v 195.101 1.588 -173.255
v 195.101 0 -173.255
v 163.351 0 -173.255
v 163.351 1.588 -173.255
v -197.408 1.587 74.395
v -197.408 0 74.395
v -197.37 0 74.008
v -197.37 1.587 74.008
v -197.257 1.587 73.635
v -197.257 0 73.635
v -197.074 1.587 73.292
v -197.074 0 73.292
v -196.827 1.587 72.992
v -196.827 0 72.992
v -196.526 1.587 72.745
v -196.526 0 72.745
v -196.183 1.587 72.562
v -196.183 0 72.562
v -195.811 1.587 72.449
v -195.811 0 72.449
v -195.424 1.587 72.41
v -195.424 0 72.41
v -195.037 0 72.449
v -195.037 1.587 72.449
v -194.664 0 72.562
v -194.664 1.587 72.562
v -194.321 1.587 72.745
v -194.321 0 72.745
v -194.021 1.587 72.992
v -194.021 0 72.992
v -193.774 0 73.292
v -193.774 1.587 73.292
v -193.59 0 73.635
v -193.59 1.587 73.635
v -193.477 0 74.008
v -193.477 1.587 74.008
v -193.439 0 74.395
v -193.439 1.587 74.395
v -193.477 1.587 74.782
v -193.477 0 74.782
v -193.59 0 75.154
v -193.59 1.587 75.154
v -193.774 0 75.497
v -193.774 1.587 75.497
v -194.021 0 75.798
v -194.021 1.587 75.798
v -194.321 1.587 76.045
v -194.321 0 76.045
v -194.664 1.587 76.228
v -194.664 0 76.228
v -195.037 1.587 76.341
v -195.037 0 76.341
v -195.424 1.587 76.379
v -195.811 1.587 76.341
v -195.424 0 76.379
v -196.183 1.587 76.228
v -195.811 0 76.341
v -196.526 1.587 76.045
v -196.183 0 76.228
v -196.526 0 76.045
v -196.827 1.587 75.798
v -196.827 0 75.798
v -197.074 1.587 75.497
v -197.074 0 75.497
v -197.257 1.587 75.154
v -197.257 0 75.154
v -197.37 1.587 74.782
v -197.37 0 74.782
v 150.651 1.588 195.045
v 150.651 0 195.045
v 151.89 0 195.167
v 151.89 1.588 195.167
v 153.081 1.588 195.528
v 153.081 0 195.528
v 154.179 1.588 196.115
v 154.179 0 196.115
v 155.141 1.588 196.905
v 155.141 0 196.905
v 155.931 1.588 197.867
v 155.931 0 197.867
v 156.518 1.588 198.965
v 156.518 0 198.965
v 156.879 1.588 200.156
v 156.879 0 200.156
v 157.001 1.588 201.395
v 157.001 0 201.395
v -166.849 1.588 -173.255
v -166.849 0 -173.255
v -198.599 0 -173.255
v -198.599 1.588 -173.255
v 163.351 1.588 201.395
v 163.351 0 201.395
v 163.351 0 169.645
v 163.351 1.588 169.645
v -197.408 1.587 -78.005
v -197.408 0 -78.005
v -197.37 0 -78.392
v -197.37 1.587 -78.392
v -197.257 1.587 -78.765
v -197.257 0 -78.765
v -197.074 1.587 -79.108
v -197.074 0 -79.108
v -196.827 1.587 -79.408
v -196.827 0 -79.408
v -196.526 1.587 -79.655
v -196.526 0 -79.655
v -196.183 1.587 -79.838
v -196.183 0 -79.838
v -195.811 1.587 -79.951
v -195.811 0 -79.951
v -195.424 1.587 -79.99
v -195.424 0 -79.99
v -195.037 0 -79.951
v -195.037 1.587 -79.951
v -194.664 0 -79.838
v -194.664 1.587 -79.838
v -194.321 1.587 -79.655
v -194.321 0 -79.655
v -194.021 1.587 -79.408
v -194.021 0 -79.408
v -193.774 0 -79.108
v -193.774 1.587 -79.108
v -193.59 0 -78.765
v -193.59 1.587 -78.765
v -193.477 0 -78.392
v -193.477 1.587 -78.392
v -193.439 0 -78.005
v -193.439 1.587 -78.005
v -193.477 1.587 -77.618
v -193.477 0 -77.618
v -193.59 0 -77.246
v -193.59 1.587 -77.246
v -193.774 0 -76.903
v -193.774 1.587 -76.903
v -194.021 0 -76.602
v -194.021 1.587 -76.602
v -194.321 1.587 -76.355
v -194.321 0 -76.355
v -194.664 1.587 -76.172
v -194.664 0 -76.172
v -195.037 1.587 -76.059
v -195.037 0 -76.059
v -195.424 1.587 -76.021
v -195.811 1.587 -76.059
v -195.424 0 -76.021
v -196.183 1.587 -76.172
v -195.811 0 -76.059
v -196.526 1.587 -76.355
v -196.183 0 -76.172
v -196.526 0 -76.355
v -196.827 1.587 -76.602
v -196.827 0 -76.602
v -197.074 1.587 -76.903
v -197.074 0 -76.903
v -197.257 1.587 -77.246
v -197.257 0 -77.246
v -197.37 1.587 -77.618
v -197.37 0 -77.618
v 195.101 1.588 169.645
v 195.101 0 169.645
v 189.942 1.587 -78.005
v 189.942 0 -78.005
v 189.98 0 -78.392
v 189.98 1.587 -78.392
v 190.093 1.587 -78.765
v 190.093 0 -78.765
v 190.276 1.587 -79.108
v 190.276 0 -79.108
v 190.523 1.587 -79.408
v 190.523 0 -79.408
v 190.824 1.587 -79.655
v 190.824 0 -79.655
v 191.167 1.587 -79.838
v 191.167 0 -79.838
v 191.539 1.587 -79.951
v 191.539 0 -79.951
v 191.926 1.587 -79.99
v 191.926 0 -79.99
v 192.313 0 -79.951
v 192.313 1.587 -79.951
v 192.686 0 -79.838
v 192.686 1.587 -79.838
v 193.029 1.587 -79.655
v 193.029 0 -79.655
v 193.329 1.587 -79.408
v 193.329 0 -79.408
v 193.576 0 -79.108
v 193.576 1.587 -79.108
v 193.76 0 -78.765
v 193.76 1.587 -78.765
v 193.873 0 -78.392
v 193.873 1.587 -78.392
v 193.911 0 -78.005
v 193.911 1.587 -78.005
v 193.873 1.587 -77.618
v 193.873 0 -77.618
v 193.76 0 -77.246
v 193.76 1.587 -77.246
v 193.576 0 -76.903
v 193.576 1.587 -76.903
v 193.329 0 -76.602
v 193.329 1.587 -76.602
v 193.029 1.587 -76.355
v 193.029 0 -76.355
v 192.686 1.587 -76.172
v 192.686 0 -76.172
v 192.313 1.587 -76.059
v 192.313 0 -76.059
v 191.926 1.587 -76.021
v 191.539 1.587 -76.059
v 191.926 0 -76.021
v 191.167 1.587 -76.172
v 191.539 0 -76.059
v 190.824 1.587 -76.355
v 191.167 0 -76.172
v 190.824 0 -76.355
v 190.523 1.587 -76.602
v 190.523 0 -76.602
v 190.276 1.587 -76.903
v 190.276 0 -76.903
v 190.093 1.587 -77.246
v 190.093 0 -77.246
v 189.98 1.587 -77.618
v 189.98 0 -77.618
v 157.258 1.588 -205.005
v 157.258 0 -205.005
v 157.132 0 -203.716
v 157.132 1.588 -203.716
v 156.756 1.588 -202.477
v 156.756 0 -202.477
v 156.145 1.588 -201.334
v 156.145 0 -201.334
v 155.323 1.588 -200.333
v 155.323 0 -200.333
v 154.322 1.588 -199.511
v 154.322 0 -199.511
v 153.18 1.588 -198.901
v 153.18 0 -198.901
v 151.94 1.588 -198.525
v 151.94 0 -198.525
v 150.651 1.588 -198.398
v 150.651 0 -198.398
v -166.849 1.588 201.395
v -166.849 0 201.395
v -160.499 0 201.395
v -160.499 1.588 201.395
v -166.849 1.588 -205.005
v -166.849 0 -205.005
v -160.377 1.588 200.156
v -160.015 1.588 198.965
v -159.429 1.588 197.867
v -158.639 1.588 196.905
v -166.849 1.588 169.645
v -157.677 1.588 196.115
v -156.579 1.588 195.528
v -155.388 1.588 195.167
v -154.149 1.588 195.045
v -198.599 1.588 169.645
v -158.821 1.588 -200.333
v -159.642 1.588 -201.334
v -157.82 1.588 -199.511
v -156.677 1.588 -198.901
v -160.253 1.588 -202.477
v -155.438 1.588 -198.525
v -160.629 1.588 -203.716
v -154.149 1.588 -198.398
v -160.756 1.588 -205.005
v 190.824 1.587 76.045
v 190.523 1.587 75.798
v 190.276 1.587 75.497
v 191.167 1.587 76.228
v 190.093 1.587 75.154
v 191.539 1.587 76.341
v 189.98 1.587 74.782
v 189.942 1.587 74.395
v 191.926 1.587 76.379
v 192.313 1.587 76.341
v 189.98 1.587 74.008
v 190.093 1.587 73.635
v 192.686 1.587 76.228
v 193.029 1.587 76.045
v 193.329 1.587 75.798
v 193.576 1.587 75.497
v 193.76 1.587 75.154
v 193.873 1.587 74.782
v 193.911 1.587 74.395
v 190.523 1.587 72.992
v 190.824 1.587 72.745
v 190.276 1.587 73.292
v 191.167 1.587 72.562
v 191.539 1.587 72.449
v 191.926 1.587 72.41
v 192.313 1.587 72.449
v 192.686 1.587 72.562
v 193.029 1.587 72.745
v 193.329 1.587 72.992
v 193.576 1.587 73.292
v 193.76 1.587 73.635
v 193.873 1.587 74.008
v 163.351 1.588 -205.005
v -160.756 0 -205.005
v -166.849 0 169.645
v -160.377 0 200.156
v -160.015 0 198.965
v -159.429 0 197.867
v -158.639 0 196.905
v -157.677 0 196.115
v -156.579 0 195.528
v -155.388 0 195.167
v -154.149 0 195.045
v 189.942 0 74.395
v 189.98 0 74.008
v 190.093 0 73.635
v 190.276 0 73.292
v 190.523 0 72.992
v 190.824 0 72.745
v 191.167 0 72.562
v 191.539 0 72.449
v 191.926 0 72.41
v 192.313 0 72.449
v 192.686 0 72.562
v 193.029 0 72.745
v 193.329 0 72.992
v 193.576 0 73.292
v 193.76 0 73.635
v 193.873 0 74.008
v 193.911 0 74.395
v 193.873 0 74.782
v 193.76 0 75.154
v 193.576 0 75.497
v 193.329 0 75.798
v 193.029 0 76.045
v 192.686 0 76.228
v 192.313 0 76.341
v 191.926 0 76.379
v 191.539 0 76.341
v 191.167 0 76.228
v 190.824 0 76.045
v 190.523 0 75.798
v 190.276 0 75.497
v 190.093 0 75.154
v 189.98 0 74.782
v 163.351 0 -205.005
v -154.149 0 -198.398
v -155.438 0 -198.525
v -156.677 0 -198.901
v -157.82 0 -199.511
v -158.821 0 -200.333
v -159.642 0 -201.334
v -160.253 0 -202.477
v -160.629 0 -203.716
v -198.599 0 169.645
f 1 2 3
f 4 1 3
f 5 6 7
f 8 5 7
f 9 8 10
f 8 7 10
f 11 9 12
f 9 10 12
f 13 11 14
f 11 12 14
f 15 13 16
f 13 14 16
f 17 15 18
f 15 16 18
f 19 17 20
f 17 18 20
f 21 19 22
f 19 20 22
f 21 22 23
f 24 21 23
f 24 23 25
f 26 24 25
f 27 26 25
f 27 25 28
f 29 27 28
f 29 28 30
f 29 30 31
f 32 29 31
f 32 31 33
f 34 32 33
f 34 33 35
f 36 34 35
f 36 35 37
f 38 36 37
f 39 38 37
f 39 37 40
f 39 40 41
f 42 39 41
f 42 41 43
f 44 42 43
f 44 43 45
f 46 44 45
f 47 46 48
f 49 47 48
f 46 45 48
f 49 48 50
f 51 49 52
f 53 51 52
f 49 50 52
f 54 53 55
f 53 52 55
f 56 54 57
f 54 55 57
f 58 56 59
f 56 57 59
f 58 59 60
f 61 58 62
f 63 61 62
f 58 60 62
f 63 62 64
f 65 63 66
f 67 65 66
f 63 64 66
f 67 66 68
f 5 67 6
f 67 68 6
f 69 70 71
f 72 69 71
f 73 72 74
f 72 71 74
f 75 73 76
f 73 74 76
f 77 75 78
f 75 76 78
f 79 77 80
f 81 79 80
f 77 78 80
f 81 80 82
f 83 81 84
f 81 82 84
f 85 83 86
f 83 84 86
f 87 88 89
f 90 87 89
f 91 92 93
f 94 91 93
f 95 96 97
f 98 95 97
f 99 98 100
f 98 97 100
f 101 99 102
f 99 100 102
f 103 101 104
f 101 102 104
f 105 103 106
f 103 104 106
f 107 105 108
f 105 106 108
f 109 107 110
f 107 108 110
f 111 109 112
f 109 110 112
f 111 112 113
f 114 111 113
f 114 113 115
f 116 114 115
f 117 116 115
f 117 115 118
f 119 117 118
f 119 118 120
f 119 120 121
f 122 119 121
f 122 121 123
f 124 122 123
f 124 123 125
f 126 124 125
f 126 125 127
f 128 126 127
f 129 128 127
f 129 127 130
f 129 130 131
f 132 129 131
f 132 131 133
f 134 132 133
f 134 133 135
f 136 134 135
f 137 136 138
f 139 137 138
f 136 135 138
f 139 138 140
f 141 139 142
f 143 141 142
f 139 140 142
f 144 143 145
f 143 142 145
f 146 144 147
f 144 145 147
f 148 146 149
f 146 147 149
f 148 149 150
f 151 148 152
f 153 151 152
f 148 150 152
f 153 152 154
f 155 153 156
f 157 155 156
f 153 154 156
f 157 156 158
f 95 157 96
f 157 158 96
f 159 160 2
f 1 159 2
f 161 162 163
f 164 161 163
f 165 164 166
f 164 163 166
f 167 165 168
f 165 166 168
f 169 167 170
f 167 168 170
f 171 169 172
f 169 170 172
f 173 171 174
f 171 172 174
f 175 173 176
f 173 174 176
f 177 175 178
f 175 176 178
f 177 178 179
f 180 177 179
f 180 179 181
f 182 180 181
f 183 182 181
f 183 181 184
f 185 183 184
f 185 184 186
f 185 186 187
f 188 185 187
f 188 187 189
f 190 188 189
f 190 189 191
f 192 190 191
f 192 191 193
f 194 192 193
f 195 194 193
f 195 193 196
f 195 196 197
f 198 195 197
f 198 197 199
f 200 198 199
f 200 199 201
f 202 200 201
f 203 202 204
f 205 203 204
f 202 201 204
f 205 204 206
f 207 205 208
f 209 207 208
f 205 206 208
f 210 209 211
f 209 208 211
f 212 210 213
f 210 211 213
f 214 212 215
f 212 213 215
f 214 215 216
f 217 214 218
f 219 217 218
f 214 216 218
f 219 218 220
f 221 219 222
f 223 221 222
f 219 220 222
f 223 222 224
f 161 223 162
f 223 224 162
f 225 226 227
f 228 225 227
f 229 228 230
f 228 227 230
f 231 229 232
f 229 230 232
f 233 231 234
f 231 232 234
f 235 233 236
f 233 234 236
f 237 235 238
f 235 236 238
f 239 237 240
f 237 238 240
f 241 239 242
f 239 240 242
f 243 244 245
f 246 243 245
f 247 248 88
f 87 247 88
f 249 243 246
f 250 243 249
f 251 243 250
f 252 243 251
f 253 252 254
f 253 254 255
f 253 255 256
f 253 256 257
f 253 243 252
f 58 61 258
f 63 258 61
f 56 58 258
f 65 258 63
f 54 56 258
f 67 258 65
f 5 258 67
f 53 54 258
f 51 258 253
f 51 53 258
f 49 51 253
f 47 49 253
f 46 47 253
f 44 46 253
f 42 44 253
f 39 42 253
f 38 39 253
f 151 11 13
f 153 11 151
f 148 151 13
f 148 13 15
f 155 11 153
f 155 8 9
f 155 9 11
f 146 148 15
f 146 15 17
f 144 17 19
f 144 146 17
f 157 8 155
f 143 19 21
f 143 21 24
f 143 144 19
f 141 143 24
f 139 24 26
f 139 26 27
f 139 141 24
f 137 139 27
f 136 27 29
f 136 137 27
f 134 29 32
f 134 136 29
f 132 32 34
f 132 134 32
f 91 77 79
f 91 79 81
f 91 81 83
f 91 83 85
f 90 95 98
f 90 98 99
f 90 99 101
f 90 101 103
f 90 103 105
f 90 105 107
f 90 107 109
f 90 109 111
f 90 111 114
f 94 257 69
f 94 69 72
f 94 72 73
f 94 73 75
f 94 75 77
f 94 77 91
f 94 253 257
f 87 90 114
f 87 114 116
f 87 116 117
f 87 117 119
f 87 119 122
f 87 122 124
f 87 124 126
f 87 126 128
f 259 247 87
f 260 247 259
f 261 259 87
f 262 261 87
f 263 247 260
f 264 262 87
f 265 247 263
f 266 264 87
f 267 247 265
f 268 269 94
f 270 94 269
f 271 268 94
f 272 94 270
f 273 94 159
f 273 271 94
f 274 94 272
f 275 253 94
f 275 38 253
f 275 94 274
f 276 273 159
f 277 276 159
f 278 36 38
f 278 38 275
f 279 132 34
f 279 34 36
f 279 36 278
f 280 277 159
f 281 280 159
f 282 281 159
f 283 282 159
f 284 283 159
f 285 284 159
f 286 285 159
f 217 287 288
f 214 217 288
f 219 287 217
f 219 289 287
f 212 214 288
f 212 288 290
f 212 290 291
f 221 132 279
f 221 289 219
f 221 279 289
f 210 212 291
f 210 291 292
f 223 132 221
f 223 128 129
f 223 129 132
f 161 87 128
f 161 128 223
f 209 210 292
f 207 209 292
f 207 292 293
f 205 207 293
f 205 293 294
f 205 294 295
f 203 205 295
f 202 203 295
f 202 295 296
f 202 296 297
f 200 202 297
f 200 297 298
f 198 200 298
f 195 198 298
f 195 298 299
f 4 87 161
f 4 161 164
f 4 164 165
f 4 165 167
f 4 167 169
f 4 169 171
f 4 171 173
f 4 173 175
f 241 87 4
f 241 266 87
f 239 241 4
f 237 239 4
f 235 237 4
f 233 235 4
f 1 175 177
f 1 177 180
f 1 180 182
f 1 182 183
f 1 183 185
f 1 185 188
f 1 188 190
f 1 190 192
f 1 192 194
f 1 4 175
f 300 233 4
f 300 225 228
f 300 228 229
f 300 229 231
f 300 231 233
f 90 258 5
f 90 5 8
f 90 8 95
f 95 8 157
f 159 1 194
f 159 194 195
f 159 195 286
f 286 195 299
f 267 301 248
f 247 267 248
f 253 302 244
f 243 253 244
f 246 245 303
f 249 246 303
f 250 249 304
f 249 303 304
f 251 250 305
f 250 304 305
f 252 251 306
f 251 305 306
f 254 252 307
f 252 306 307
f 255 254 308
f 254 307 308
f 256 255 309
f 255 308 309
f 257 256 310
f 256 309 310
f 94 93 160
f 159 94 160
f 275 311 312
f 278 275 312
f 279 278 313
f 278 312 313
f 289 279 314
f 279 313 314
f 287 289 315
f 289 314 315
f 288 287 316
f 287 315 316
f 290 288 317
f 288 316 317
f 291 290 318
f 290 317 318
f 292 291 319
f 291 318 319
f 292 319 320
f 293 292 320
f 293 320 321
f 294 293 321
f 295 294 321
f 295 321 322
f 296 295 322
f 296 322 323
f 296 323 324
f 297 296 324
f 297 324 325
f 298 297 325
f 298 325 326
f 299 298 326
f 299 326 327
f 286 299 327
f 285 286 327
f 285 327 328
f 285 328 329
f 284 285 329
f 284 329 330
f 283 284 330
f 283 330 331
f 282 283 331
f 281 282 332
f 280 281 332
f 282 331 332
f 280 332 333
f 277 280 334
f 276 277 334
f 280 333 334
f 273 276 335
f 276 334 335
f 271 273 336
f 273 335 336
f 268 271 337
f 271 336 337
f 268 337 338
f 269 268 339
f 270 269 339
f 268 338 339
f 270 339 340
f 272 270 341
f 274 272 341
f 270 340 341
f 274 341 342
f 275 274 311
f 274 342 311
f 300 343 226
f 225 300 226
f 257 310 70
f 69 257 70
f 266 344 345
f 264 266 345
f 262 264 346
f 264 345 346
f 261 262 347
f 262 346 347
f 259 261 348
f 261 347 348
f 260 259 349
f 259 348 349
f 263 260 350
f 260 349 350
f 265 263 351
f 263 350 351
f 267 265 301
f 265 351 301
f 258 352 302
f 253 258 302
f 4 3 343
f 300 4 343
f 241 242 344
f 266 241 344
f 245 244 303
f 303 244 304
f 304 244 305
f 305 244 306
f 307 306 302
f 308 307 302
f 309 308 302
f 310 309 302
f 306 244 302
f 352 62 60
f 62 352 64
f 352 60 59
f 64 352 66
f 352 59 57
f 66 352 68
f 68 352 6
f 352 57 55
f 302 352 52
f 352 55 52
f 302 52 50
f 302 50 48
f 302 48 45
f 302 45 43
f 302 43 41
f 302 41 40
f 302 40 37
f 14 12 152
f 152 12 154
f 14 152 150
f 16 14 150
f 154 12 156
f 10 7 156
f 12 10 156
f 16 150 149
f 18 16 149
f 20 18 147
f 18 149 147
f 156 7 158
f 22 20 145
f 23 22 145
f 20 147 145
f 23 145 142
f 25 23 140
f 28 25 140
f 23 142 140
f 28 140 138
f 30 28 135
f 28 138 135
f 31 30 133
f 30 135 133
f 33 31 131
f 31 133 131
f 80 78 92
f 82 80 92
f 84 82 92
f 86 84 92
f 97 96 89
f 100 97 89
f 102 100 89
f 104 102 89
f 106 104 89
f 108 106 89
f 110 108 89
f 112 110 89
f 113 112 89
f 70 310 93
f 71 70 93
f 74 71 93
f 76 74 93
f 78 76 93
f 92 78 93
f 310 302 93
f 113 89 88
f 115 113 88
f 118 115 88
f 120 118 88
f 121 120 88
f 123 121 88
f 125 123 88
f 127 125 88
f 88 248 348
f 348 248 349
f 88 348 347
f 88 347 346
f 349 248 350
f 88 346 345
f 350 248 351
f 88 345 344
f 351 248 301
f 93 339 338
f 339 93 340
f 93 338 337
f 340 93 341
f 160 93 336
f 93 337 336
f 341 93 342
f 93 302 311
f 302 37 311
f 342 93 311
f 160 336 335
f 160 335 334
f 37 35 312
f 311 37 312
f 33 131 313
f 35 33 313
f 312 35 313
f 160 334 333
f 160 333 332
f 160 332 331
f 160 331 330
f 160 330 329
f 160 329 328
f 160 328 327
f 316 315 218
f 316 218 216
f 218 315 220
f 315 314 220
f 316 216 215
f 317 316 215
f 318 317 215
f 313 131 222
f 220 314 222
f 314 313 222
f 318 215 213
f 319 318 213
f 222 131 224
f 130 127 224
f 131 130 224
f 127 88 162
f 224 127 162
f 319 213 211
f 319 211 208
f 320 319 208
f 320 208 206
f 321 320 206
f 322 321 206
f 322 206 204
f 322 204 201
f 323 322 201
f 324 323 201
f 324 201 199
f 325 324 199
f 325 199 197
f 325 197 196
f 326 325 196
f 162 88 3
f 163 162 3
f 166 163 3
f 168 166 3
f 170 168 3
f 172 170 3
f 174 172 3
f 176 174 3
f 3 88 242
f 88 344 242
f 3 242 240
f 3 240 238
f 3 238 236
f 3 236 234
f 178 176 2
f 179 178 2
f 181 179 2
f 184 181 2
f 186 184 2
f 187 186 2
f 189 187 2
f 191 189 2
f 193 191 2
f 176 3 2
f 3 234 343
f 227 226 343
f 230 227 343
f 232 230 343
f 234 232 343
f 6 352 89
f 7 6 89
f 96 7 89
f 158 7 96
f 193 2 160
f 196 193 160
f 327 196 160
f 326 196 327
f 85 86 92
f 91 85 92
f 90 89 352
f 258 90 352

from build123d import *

# Parameters (mm, degrees)
BOSS_EXTRUDE1_DEPTH             = 1.5875
F_5_32_0_15625_DIAMETER_HOLE1_D = 3.96875


with BuildPart() as part:
    # Sketch1 → Boss-Extrude1 (new body)
    with BuildSketch(Plane(origin=(0, 0, 0), x_dir=(1, 0, 0), z_dir=(0, 1, 0))):
        with BuildLine():
            Line((-160.755952561, 205.005137025), (-166.848726493, 205.005137025))
            Line((-166.848726493, 205.005137025), (-166.848726493, 173.255137025))
            Line((-166.848726493, 173.255137025), (-198.598726493, 173.255137025))
            Line((-198.598726493, 173.255137025), (-198.598726493, -169.644862975))
            Line((-198.598726493, -169.644862975), (-166.848726493, -169.644862975))
            Line((-166.848726493, -169.644862975), (-166.848726493, -201.394862975))
            Line((-166.848726493, -201.394862975), (-160.498726493, -201.394862975))
            ThreePointArc((-160.498726493, -201.394862975), (-158.638854554, -196.904734914), (-154.148726493, -195.044862975))
            Line((-154.148726493, -195.044862975), (150.651273507, -195.044862975))
            ThreePointArc((150.651273507, -195.044862975), (155.141401567, -196.904734914), (157.001273507, -201.394862975))
            Line((157.001273507, -201.394862975), (163.351273507, -201.394862975))
            Line((163.351273507, -201.394862975), (163.351273507, -169.644862975))
            Line((163.351273507, -169.644862975), (195.101273507, -169.644862975))
            Line((195.101273507, -169.644862975), (195.101273507, 173.255137025))
            Line((195.101273507, 173.255137025), (163.351273507, 173.255137025))
            Line((163.351273507, 173.255137025), (163.351273507, 205.005137025))
            Line((163.351273507, 205.005137025), (157.258499575, 205.005137025))
            ThreePointArc((157.258499575, 205.005137025), (155.323287864, 200.333122668), (150.651273507, 198.397910957))
            Line((150.651273507, 198.397910957), (-154.148726493, 198.397910957))
            ThreePointArc((-154.148726493, 198.397910957), (-158.820740851, 200.333122668), (-160.755952561, 205.005137025))
        make_face()
    extrude(amount=BOSS_EXTRUDE1_DEPTH)

    # 5/32 (0.15625) Diameter Hole1 (through all)
    with Locations(Plane(origin=(0, 1.5875, 0), x_dir=(1, 0, 0), z_dir=(0, 1, 0))):
        with Locations((-195.423726493, 78.005137025), (-195.423726493, -74.394862975), (191.926273507, -74.394862975), (191.926273507, 78.005137025)):
            Hole(F_5_32_0_15625_DIAMETER_HOLE1_D / 2)


solid = part.part
